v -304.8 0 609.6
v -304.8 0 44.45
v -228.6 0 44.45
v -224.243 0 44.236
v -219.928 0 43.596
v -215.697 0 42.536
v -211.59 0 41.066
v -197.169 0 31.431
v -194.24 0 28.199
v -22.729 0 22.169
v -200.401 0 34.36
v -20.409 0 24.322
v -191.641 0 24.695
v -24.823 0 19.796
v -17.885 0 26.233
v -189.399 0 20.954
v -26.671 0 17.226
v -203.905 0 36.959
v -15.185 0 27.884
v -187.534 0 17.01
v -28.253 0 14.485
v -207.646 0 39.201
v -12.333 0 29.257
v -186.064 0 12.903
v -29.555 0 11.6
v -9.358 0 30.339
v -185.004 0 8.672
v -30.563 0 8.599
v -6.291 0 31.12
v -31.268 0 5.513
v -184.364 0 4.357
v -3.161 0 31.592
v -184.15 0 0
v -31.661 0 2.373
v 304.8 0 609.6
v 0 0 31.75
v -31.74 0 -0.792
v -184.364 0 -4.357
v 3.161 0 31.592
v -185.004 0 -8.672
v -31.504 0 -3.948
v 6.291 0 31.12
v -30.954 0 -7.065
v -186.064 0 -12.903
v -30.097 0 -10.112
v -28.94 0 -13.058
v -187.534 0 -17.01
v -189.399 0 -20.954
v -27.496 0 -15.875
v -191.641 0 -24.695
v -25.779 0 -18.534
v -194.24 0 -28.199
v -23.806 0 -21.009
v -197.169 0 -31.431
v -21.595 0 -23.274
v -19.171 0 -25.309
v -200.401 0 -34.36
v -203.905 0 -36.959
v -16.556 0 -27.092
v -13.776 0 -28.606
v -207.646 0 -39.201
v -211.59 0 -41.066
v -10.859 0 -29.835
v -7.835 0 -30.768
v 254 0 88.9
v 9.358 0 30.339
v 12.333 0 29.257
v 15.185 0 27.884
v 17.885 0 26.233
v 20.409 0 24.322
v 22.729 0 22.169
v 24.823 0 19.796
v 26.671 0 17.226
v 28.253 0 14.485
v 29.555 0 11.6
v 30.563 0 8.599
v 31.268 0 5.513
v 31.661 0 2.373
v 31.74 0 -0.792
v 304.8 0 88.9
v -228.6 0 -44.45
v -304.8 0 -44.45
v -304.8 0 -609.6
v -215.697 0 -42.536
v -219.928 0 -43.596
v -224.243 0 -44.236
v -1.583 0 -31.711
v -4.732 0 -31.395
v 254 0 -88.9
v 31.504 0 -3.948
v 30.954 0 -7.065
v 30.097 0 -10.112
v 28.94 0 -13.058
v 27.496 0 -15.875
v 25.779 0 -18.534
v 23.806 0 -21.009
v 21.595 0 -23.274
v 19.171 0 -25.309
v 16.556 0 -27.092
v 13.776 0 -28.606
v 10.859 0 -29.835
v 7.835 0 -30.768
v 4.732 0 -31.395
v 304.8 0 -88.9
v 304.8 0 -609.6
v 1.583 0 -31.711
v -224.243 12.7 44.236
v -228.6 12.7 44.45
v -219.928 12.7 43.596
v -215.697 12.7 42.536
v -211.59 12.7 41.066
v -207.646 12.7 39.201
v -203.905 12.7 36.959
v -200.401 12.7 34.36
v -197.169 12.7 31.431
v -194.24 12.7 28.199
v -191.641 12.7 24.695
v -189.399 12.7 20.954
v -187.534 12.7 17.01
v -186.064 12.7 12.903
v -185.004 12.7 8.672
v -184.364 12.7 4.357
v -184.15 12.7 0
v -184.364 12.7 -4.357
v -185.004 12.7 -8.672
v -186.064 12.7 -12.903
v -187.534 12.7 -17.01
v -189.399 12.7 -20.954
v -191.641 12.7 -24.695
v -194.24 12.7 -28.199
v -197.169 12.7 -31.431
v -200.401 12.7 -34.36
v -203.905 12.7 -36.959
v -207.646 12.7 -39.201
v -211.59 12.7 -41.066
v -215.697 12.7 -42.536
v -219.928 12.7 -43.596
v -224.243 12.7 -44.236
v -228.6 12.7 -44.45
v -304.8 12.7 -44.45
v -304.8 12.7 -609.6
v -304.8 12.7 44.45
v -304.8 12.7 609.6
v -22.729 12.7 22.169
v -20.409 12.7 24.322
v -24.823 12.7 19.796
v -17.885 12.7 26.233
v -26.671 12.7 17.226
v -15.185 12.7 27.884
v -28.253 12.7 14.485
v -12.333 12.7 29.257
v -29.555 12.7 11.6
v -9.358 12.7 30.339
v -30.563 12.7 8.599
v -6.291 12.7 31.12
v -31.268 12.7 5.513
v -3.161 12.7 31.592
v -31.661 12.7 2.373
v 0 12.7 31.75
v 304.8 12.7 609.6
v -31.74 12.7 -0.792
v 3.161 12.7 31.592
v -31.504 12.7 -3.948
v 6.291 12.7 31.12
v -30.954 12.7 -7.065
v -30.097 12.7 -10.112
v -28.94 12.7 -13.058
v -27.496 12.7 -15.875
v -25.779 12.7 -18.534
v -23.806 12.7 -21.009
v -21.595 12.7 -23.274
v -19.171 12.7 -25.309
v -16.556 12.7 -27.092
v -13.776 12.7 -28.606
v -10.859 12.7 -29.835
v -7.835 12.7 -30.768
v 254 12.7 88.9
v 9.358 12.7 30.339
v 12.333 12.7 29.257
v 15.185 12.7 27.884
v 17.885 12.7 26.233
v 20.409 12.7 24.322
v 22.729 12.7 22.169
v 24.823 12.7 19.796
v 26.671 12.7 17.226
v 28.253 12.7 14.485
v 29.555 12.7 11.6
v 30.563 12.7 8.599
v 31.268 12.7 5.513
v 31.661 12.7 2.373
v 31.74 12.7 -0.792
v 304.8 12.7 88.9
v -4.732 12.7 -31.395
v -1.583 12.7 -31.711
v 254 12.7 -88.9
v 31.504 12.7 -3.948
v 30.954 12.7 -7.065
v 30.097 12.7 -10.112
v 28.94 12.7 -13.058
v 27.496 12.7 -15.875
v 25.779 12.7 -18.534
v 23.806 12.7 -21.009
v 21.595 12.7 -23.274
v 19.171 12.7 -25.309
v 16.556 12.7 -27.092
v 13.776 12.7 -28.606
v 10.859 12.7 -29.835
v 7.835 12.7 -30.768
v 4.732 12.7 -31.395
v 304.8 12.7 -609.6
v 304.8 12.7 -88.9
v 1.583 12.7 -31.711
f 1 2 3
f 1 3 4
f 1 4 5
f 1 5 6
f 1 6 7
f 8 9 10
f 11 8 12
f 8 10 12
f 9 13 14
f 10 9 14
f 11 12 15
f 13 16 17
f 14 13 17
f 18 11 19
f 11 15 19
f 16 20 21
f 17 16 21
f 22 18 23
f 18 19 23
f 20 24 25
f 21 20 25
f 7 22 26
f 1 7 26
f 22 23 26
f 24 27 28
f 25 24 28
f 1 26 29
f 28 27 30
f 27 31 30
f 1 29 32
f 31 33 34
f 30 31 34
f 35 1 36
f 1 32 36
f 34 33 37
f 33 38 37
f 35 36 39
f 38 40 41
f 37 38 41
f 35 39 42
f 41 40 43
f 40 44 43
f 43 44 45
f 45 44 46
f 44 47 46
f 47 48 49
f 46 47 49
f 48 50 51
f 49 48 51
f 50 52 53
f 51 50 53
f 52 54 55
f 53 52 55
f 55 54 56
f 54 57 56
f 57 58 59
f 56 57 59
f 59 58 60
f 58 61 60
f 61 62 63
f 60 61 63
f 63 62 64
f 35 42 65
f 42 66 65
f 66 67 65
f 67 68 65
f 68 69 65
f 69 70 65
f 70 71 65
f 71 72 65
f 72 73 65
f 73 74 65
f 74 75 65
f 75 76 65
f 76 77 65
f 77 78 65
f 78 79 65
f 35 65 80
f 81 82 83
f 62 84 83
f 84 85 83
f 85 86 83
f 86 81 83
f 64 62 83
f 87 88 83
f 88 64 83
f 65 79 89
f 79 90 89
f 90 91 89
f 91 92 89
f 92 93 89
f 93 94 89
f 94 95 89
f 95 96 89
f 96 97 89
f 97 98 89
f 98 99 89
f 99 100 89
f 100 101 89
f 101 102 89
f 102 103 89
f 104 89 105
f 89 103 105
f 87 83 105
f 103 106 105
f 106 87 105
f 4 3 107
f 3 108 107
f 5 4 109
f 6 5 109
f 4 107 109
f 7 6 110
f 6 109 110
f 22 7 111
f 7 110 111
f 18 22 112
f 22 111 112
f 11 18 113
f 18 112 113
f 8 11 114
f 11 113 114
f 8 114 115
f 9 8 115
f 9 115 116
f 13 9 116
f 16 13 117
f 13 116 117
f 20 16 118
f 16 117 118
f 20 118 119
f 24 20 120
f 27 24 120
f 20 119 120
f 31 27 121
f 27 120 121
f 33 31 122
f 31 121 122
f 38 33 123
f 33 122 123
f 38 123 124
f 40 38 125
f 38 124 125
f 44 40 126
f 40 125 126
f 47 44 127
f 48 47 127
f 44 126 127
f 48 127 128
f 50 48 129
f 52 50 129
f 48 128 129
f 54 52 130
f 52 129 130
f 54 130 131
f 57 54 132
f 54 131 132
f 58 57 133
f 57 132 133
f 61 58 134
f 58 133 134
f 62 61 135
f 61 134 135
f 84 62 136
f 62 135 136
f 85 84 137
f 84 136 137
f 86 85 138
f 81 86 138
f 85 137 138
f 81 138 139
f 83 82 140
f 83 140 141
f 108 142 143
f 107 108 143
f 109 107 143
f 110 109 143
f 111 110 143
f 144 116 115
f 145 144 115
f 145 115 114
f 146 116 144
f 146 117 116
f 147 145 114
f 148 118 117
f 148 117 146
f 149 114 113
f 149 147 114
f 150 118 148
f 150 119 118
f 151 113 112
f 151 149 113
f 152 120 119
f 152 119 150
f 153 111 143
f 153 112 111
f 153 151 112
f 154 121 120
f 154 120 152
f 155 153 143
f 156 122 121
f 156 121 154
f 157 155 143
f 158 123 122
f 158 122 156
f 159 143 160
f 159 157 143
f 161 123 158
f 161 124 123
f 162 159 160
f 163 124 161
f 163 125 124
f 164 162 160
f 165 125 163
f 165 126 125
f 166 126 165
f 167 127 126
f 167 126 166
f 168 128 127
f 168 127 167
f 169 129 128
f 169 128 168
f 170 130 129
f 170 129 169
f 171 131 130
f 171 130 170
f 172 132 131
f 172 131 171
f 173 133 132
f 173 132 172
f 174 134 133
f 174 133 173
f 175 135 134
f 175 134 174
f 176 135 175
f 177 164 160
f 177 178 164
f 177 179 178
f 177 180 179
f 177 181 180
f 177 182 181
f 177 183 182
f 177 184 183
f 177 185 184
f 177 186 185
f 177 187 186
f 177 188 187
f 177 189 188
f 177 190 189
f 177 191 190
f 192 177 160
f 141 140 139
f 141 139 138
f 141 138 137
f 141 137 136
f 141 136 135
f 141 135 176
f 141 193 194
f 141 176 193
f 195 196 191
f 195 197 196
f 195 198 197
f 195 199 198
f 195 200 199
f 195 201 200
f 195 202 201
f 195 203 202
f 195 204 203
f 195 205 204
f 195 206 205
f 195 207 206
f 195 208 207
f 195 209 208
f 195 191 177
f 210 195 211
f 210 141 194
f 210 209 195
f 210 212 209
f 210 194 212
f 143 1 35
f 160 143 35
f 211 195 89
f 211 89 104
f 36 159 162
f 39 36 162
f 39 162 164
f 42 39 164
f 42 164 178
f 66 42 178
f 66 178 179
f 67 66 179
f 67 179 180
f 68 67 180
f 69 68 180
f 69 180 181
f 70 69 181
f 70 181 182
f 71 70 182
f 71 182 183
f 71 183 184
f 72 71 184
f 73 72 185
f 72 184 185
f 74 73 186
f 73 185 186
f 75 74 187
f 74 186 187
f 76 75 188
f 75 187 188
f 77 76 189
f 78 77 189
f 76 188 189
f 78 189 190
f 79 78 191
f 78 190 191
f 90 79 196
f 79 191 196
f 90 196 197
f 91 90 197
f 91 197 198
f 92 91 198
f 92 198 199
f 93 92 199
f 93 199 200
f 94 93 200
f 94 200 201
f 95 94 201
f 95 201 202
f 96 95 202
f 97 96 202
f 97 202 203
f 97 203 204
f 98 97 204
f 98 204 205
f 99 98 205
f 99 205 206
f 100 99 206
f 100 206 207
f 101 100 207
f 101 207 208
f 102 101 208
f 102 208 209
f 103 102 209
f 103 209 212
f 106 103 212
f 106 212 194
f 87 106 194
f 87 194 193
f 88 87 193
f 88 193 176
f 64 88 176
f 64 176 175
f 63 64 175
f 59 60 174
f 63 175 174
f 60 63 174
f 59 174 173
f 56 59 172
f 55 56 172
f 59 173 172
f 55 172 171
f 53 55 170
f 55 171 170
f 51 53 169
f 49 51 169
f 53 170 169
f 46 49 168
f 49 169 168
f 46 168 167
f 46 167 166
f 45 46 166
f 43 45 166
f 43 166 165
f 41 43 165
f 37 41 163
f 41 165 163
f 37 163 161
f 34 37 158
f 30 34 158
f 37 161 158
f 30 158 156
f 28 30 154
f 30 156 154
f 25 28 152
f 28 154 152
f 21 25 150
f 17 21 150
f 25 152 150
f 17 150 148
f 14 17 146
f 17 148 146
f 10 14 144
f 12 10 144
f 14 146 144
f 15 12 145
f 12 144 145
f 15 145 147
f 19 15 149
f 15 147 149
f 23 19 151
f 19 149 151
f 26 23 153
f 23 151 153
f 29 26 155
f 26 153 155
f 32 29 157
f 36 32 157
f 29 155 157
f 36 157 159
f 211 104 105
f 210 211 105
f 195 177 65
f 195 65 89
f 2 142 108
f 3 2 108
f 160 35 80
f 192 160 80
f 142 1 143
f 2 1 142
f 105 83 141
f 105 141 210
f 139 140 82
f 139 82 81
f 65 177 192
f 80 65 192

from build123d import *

# Parameters (mm, degrees)
SKETCH1_W           = 609.6
SKETCH1_H           = 1219.2
BOSS_EXTRUDE1_DEPTH = 12.7
SKETCH6_R           = 31.75
CUT_EXTRUDE3_DEPTH  = 682.671834536
SKETCH8_W           = 415.926094716
SKETCH8_H           = 177.8
CUT_EXTRUDE4_DEPTH  = 682.671834536
SKETCH10_W          = 180.418217341
SKETCH10_H          = 88.9
CUT_EXTRUDE7_DEPTH  = 682.671834536
SKETCH14_R          = 44.45
CUT_EXTRUDE8_DEPTH  = 682.671834536


with BuildPart() as part:
    # Sketch1 → Boss-Extrude1 (new body)
    with BuildSketch(Plane(origin=(0, 0, 0), x_dir=(1, 0, 0), z_dir=(0, 1, 0))):
        Rectangle(SKETCH1_W, SKETCH1_H)
    extrude(amount=BOSS_EXTRUDE1_DEPTH)

    # Sketch6 → Cut-Extrude3 (cut, through all)
    with BuildSketch(Plane(origin=(0, 12.7, 0), x_dir=(-1, 0, 0), z_dir=(0, 1, 0))):
        with Locations(Location((0, 0, 0), (0, 0, 90))):
            Circle(SKETCH6_R)
    extrude(amount=-CUT_EXTRUDE3_DEPTH, mode=Mode.SUBTRACT)

    # Sketch8 → Cut-Extrude4 (cut, through all)
    with BuildSketch(Plane(origin=(0, 12.7, 0), x_dir=(1, 0, 0), z_dir=(0, 1, 0))):
        with Locations((461.963047358, 0)):
            Rectangle(SKETCH8_W, SKETCH8_H)
    extrude(amount=-CUT_EXTRUDE4_DEPTH, mode=Mode.SUBTRACT)

    # Sketch10 → Cut-Extrude7 (cut, through all)
    with BuildSketch(Plane(origin=(0, 12.7, 0), x_dir=(1, 0, 0), z_dir=(0, 1, 0))):
        with Locations((-318.80910867, 0)):
            Rectangle(SKETCH10_W, SKETCH10_H)
    extrude(amount=-CUT_EXTRUDE7_DEPTH, mode=Mode.SUBTRACT)

    # Sketch14 → Cut-Extrude8 (cut, through all)
    with BuildSketch(Plane(origin=(0, 12.7, 0), x_dir=(1, 0, 0), z_dir=(0, 1, 0))):
        with Locations((-228.6, 0)):
            Circle(SKETCH14_R)
    extrude(amount=-CUT_EXTRUDE8_DEPTH, mode=Mode.SUBTRACT)


solid = part.part
